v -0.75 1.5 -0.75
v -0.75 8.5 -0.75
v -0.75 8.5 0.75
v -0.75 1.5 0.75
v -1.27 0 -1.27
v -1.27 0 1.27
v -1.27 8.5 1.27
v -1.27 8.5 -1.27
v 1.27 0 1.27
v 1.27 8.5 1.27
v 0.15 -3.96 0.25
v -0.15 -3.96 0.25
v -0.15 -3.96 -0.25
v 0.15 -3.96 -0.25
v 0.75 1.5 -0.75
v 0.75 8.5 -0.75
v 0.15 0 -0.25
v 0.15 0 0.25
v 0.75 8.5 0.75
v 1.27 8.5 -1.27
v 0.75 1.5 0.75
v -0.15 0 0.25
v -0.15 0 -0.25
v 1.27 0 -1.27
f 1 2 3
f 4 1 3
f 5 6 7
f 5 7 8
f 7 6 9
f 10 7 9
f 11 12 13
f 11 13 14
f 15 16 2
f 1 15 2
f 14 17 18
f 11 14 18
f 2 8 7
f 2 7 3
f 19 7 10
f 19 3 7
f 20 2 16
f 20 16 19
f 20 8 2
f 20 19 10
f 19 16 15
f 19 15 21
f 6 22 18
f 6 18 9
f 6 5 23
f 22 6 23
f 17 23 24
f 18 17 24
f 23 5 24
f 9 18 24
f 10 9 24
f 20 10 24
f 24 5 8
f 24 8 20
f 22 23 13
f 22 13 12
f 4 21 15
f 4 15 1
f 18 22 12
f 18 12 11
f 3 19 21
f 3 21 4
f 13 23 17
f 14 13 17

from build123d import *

# Parameters (mm, degrees)
SKETCH_2_W          = 2.54
SKETCH_2_H          = 2.54
EXTRUDE_1_DEPTH     = 8.5
SKETCH_3_W          = 0.3
SKETCH_3_H          = 0.5
EXTRUDE_2_DEPTH     = 3.96
SKETCH_4_W          = 1.5
SKETCH_4_H          = 1.5
CUT_EXTRUDE_1_DEPTH = 7


with BuildPart() as part:
    # 草图2 → 拉伸1 (new body)
    with BuildSketch(Plane(origin=(0, 0, 0), x_dir=(1, 0, 0), z_dir=(0, 1, 0))):
        Rectangle(SKETCH_2_W, SKETCH_2_H)
    extrude(amount=EXTRUDE_1_DEPTH)

    # 草图3 → 拉伸2 (add)
    with BuildSketch(Plane.XZ):
        Rectangle(SKETCH_3_W, SKETCH_3_H)
    extrude(amount=EXTRUDE_2_DEPTH)

    # 草图4 → 切除-拉伸1 (cut)
    with BuildSketch(Plane(origin=(0, 8.5, 0), x_dir=(-1, 0, 0), z_dir=(0, 1, 0))):
        Rectangle(SKETCH_4_W, SKETCH_4_H)
    extrude(amount=-CUT_EXTRUDE_1_DEPTH, mode=Mode.SUBTRACT)


solid = part.part
